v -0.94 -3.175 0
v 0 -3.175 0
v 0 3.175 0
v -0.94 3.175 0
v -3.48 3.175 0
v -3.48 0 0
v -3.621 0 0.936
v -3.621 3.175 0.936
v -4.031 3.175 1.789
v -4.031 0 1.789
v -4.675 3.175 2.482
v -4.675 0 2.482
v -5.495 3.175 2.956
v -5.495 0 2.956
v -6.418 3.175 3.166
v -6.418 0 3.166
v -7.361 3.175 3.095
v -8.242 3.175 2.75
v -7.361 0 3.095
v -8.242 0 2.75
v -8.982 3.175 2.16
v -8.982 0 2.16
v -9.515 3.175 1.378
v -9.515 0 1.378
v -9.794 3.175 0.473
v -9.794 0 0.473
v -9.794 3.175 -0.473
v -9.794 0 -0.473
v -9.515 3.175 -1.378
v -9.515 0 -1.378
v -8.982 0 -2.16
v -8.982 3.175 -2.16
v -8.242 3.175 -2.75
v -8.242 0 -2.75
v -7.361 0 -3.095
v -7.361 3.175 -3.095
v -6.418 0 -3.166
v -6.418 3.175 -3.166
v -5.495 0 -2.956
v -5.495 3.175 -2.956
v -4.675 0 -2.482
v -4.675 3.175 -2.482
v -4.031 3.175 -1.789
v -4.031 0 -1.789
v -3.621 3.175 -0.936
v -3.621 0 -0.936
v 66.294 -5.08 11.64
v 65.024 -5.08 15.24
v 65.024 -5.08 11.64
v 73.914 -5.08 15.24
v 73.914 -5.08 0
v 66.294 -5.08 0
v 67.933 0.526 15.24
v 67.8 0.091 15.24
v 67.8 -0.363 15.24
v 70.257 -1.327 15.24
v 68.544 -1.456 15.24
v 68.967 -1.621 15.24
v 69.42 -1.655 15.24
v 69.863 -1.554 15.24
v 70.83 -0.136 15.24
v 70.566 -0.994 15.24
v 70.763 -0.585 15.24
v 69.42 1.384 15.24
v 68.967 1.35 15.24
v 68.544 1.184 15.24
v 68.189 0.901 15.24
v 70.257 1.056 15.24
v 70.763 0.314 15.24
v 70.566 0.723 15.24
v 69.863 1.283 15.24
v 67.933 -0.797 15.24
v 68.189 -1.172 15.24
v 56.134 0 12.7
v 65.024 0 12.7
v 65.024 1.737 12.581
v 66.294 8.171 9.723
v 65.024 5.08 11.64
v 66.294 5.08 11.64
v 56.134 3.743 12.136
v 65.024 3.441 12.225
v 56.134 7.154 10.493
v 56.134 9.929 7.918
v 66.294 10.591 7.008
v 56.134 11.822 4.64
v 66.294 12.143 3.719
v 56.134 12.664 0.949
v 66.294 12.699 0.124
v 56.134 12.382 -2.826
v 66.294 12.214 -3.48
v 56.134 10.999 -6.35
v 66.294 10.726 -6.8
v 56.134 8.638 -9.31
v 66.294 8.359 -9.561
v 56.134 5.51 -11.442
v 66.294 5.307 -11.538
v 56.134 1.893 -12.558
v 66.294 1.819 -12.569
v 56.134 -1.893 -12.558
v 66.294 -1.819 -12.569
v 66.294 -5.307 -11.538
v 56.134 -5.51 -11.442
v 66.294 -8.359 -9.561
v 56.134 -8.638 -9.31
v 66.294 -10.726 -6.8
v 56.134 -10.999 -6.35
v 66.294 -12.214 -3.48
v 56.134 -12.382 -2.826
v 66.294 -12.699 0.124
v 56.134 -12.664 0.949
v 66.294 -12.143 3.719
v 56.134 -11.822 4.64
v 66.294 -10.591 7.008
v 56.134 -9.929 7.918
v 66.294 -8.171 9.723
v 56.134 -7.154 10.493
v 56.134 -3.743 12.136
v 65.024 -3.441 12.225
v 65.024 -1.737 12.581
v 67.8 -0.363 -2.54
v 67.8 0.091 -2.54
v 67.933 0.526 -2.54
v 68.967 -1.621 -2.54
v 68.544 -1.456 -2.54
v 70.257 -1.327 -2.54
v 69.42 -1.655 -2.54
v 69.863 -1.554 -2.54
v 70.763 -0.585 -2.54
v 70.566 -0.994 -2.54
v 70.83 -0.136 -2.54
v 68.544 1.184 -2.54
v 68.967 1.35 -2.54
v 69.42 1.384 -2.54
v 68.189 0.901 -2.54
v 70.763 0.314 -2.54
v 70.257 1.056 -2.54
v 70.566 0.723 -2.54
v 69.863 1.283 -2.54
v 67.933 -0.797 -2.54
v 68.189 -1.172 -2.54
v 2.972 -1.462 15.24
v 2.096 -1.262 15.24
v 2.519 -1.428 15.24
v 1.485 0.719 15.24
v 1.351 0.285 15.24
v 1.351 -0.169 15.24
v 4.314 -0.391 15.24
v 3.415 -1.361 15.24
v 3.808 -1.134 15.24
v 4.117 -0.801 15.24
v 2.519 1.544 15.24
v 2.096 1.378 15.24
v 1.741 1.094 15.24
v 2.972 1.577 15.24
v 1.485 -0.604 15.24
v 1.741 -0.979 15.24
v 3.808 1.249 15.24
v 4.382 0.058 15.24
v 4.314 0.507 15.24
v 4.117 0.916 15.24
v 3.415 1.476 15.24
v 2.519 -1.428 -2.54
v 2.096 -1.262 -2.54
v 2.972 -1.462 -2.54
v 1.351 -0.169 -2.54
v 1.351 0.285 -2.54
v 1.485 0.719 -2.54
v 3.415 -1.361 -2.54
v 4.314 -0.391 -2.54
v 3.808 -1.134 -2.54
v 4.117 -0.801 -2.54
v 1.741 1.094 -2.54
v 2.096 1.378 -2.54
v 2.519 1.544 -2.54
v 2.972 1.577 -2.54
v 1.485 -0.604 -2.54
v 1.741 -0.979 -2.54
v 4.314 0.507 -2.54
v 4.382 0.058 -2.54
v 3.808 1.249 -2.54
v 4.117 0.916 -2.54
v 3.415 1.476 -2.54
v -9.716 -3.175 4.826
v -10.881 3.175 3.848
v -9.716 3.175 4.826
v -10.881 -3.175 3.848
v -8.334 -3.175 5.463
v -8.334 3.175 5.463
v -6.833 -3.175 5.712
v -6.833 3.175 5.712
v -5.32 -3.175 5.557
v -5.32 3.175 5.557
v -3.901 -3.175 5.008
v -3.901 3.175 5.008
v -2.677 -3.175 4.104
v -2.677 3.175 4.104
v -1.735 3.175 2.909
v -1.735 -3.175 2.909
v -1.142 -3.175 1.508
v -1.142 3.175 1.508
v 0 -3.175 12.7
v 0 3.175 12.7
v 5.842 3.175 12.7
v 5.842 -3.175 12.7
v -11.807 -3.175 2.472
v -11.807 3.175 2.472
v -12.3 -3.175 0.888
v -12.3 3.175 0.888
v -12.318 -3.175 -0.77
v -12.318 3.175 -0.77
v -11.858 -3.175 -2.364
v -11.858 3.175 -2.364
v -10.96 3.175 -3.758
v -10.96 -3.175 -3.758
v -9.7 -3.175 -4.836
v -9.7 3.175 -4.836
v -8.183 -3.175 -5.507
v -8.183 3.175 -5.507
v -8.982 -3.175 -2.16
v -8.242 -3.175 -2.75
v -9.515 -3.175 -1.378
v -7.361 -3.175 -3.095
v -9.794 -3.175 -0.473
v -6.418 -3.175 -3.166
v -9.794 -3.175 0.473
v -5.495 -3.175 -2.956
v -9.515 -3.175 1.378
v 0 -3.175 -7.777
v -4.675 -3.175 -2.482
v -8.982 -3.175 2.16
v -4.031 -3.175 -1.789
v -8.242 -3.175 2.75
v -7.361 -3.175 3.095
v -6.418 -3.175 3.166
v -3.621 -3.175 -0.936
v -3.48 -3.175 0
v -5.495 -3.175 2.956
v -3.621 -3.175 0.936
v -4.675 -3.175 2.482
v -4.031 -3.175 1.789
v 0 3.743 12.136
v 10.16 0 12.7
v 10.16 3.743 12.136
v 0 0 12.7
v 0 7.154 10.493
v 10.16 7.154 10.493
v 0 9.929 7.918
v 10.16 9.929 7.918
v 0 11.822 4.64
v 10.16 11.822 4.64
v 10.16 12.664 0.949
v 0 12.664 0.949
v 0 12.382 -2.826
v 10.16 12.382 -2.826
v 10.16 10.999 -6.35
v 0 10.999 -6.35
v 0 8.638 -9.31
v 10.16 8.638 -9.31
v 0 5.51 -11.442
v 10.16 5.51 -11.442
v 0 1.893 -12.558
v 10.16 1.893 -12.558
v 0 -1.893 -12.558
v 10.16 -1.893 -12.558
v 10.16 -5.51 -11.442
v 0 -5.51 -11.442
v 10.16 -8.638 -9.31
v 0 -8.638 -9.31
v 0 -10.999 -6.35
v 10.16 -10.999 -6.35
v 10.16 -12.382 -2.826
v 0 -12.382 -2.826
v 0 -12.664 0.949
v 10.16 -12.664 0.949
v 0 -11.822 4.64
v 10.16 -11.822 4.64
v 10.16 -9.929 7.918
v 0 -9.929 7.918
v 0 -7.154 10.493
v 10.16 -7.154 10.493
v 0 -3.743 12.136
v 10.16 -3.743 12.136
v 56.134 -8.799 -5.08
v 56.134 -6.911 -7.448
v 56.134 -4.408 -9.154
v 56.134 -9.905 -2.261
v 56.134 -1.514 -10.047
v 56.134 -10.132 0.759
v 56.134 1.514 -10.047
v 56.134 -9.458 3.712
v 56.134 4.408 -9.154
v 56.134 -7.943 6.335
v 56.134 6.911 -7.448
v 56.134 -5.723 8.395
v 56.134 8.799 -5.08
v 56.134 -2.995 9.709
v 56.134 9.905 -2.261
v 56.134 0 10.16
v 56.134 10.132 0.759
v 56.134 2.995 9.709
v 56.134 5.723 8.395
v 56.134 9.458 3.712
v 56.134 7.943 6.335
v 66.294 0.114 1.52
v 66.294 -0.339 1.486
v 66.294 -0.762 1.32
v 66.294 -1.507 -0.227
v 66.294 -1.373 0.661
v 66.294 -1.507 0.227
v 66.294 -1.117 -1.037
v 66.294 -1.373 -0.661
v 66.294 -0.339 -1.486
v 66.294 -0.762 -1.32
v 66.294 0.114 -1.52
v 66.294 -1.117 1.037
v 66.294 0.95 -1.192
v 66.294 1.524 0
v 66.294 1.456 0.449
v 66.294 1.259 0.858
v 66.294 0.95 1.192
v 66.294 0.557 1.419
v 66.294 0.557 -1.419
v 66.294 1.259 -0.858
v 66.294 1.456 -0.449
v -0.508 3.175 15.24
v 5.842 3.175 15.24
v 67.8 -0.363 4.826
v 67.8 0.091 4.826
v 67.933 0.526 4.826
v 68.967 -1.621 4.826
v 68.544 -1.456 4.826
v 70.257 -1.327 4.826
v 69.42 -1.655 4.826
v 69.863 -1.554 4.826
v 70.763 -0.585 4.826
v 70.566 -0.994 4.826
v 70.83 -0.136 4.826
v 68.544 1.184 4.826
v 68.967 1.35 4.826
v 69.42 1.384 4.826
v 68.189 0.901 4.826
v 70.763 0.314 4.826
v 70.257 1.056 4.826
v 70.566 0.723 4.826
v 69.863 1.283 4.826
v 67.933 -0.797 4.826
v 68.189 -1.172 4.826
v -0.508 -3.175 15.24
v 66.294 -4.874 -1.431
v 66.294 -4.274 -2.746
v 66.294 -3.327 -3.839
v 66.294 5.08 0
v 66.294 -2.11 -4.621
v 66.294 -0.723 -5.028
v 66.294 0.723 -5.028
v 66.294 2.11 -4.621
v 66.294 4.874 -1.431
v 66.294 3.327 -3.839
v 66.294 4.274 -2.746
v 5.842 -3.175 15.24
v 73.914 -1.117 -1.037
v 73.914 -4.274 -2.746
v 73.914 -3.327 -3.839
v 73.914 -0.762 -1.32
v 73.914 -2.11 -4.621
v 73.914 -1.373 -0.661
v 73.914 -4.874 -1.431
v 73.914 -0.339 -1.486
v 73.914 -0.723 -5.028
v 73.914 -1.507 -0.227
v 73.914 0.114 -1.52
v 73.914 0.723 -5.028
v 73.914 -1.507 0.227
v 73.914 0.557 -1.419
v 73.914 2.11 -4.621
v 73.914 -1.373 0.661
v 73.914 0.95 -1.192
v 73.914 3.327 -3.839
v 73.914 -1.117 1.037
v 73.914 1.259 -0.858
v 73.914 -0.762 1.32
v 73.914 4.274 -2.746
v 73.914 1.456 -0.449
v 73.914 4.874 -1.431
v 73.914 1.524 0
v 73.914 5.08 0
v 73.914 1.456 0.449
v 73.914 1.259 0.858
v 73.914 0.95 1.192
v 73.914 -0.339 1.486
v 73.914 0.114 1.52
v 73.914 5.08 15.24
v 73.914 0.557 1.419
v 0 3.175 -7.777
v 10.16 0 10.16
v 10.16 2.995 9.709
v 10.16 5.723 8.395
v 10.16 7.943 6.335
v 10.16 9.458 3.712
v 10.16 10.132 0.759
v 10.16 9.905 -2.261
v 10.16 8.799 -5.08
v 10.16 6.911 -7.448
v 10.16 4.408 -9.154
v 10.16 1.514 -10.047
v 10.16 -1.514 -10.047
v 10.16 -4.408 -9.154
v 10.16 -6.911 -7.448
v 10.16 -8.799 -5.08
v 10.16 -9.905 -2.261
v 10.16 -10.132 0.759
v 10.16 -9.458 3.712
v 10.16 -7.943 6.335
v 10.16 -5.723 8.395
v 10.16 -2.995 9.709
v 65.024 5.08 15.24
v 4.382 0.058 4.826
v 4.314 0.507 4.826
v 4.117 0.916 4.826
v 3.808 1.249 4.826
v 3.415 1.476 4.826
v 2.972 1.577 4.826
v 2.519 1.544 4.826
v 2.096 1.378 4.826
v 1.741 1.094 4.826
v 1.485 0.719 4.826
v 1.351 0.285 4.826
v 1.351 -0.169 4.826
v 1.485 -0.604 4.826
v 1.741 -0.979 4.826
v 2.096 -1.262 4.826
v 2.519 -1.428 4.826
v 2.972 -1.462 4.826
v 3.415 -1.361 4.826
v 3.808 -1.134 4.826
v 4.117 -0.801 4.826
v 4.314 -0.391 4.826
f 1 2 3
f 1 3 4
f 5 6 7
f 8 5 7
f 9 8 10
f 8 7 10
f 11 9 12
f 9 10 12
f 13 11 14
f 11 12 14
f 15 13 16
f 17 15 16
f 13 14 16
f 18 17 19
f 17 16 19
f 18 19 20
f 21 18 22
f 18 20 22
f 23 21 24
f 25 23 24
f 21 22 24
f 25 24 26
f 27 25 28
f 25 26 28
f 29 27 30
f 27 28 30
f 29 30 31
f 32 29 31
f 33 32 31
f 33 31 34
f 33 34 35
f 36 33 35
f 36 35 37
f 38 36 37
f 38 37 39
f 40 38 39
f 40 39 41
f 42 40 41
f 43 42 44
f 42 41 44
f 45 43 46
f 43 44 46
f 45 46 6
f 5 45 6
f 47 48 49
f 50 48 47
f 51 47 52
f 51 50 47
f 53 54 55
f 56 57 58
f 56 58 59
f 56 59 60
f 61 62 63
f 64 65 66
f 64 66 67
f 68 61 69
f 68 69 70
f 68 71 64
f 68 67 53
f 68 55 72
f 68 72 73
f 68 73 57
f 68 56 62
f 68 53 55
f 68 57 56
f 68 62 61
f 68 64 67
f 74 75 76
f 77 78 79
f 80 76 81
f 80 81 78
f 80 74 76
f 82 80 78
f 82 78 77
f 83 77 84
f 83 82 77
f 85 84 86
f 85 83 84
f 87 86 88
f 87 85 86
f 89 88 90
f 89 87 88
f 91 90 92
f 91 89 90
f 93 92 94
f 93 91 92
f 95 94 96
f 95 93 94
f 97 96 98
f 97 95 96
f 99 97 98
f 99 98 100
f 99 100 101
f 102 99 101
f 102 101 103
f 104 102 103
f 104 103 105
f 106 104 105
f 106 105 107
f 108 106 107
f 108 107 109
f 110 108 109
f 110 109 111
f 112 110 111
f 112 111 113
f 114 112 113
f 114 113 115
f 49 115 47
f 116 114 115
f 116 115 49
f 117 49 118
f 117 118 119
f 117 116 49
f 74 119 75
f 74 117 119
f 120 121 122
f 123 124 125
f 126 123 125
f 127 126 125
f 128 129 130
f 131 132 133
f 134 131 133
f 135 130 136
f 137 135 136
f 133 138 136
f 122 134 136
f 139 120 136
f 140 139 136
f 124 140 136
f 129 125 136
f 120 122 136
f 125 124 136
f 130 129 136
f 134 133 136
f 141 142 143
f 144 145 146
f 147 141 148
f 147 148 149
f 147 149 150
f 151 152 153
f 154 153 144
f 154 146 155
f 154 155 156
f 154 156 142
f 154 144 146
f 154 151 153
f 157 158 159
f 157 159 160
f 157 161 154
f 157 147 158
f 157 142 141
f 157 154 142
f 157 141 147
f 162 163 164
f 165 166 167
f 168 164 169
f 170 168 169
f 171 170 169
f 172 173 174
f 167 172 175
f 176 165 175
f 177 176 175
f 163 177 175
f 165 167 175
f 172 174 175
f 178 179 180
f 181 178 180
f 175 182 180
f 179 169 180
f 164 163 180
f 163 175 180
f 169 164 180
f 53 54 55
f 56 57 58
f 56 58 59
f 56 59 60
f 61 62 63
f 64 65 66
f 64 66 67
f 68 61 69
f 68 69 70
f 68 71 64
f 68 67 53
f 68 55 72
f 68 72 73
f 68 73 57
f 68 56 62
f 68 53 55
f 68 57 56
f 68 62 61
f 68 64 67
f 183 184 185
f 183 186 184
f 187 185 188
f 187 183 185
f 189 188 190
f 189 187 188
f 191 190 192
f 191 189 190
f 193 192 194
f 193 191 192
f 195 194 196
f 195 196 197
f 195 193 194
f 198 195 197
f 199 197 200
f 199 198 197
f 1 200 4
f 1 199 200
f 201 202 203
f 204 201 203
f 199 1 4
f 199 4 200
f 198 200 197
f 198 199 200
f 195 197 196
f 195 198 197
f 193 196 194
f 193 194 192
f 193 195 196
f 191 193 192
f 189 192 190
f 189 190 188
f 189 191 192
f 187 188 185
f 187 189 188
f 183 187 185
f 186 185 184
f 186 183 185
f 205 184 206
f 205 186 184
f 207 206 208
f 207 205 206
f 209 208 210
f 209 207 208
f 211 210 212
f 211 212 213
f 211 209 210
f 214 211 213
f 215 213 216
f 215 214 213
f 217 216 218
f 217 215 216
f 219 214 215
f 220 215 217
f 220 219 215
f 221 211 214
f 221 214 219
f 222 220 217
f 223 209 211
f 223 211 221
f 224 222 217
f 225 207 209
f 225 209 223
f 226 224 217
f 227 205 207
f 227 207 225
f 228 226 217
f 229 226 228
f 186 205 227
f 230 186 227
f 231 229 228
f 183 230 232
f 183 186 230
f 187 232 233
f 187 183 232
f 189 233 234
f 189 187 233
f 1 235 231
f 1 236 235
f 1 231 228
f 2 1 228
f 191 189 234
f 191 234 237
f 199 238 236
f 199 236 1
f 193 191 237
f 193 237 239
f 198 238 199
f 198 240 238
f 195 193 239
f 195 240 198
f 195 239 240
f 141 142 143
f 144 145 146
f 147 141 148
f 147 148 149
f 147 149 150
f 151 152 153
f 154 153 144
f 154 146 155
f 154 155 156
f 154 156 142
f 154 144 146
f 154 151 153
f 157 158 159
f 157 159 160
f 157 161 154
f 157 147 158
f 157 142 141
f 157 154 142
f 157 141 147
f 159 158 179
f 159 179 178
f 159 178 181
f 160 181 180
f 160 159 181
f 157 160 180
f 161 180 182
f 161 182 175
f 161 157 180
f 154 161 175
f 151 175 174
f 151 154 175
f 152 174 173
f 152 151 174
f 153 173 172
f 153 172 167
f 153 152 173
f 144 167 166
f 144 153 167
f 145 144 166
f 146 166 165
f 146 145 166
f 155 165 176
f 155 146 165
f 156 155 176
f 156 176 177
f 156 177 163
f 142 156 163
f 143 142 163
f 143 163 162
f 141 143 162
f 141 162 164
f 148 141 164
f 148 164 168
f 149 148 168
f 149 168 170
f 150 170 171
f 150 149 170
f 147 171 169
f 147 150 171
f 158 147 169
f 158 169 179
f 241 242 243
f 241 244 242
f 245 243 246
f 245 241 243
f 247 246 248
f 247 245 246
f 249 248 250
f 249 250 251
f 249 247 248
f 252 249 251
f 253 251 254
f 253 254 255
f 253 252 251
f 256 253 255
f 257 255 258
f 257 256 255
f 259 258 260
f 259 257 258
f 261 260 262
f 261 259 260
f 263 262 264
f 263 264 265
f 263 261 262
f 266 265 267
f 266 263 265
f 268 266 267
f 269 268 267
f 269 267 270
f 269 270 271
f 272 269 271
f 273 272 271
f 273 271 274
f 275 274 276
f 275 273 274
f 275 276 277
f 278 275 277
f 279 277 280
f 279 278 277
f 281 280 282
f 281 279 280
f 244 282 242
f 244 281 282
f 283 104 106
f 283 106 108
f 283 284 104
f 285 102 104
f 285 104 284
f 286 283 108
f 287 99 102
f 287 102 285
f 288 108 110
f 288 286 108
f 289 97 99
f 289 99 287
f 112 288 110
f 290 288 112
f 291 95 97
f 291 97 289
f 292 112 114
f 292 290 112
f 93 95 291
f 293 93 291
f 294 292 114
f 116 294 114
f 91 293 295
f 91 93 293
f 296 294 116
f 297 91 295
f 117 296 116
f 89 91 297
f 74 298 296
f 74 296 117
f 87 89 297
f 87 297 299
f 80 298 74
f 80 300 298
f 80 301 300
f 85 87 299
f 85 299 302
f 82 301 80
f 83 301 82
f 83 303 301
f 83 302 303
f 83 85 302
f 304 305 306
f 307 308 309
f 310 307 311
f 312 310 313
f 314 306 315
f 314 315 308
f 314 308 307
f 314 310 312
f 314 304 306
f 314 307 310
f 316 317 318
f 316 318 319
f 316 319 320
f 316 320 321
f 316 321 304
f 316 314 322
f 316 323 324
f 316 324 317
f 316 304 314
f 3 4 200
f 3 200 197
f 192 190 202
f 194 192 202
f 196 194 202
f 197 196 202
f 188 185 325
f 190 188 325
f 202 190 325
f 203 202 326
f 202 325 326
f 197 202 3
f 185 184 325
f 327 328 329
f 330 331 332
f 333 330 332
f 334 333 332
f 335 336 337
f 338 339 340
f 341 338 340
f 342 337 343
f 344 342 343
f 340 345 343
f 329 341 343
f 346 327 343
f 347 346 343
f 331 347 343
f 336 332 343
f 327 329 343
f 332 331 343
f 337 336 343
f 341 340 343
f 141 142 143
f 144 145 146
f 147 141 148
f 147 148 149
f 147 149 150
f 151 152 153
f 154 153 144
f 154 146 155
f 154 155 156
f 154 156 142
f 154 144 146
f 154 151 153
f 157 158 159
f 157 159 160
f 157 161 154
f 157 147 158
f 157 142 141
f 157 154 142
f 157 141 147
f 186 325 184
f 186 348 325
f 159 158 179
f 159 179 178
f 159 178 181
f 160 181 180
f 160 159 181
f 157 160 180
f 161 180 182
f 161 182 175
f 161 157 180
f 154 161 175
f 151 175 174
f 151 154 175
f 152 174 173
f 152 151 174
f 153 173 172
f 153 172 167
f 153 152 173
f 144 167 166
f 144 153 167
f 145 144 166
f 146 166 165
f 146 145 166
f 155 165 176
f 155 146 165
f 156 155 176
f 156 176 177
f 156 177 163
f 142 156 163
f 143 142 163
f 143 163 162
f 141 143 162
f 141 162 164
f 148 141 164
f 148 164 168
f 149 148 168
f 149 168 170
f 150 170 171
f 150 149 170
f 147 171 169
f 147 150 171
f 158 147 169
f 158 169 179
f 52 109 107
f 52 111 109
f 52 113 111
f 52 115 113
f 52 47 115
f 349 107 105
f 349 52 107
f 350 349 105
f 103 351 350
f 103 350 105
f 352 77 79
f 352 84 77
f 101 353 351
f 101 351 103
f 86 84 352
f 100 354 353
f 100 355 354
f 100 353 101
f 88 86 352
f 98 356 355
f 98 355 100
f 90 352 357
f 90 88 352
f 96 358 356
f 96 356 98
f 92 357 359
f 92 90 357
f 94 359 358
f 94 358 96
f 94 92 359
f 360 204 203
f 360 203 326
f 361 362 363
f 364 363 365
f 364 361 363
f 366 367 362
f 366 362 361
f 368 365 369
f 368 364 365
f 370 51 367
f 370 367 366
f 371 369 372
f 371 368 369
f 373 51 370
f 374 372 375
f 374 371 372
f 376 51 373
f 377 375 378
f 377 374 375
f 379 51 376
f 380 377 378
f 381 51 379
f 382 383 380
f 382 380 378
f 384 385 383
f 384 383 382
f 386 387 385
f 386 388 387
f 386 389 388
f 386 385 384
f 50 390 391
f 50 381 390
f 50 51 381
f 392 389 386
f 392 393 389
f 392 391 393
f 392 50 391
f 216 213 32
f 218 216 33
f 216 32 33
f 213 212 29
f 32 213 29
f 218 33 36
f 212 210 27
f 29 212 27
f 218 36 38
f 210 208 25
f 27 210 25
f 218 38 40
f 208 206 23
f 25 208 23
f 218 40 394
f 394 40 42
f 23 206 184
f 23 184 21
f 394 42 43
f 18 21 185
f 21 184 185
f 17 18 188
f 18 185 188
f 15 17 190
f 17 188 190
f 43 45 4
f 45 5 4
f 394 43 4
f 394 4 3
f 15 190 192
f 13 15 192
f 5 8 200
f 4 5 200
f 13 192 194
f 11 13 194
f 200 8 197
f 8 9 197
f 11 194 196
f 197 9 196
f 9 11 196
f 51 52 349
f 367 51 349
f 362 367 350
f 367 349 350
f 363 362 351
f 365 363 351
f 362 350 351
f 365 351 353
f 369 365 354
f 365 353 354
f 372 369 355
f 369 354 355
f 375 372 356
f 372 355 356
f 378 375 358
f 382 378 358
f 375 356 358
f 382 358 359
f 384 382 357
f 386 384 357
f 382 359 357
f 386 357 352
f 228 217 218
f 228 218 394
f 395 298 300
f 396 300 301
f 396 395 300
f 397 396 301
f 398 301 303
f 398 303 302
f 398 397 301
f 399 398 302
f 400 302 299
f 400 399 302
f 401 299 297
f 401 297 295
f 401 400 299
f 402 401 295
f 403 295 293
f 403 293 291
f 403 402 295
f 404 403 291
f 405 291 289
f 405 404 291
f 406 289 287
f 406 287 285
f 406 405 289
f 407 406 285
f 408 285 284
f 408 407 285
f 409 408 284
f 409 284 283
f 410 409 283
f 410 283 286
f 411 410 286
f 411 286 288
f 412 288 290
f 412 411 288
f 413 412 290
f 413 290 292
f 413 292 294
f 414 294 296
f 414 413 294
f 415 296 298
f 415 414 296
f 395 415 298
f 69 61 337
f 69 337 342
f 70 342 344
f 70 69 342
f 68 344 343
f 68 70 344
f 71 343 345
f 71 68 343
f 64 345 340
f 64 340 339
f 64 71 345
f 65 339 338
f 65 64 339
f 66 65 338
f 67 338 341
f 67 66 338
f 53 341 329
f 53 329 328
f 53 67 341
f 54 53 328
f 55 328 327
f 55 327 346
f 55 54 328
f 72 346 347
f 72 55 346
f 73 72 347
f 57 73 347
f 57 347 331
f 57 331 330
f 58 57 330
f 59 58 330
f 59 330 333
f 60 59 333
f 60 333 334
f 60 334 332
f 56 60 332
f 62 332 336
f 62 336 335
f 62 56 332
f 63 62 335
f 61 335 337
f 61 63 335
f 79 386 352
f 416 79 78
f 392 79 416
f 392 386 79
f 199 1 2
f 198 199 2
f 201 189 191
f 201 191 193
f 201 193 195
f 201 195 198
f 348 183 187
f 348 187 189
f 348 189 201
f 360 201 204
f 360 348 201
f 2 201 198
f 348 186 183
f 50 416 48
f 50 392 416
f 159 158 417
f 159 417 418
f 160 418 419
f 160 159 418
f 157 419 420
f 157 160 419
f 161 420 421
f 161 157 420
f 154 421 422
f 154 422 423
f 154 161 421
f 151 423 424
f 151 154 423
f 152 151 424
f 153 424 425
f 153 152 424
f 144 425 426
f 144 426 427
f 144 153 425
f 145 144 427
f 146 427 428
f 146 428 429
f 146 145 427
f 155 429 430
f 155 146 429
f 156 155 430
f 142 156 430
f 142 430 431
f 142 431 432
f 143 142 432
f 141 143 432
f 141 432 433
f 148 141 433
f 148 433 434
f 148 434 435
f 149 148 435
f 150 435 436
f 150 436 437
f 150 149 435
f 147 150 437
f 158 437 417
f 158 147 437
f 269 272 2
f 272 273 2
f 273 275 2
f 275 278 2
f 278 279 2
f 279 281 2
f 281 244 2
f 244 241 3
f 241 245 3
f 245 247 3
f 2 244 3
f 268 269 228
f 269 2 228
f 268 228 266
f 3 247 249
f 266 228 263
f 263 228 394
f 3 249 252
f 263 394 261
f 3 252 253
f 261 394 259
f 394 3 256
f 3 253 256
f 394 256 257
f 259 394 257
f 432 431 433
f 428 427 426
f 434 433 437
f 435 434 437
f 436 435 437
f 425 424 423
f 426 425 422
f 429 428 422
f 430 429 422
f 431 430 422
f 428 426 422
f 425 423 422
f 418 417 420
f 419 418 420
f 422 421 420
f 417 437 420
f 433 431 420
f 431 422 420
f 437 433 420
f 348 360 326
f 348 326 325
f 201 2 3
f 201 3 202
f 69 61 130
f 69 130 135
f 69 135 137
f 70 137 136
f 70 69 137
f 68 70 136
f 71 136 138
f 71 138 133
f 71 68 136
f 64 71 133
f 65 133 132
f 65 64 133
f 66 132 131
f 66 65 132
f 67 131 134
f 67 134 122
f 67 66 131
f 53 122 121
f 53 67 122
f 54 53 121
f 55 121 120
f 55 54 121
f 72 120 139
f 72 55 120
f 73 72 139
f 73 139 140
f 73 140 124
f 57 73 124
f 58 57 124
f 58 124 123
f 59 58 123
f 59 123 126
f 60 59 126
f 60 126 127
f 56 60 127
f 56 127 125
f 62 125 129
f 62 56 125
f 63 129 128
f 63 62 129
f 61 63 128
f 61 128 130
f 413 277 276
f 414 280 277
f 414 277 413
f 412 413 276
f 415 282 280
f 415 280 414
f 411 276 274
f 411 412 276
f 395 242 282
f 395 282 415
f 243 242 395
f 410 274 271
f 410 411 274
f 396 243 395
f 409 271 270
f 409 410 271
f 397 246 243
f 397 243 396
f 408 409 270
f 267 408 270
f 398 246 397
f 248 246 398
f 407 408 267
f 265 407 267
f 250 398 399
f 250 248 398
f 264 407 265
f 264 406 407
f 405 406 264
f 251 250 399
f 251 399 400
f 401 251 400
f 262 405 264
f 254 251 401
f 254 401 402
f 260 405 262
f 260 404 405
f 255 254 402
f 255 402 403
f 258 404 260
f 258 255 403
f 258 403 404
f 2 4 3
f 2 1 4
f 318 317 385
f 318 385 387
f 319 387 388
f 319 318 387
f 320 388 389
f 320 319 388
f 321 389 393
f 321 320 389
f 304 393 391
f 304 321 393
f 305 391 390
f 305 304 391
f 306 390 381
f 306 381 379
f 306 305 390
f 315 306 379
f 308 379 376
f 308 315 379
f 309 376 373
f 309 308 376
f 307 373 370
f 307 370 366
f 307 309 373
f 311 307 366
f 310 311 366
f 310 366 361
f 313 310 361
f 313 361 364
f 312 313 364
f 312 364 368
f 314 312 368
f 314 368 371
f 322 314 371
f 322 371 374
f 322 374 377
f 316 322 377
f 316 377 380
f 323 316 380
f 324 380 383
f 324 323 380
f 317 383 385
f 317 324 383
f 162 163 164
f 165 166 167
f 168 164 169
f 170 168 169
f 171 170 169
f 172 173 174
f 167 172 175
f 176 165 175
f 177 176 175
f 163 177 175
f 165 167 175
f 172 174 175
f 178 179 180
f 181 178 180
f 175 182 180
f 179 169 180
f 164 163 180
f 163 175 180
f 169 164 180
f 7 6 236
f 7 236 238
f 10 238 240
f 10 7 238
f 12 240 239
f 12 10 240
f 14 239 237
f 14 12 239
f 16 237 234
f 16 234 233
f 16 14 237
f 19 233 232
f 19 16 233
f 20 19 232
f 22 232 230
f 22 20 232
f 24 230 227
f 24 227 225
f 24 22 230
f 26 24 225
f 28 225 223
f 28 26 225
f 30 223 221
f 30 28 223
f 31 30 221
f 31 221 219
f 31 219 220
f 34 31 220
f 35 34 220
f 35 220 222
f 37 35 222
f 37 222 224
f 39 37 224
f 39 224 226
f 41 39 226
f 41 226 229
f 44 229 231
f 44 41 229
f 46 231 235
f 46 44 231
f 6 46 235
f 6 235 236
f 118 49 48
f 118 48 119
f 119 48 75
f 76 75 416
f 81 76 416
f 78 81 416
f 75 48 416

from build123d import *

# Parameters (mm, degrees)
F0_W          = 5.842
F0_H          = 12.7
F0_R          = 3.175
F2_DEPTH      = 3.175
F3_DEPTH      = 3.175
F4_R          = 1.524
F5_DEPTH      = 7.62
F5_DEPTH_BACK = 1.27
F7_R          = 1.524
F8_DEPTH      = 17.78
F9_DEPTH      = 17.78
F10_DEPTH     = 10.414


with BuildPart() as f1:
    # F0 (on Front) → F1 (revolve)
    with BuildSketch(Plane.XZ):
        Polygon((5.842, 12.7), (5.842, 0), (66.294, 0), (66.294, 12.7), (56.134, 12.7), (56.134, 10.16), (10.16, 10.16), (10.16, 12.7), align=None)
        with Locations((2.921, 6.35)):
            Rectangle(F0_W, F0_H)
    revolve(axis=Axis((33.147, 0, 0), (-1, 0, 0)))

    # F0 (on Front) → F2 (join, symmetric)
    with BuildSketch(Plane.XZ):
        with BuildLine():
            ThreePointArc((-8.1826630726, -5.5069827884), (-3.1957909266, -4.5493385486), (-0.9398, 0))
            ThreePointArc((-0.9398, 0), (-4.5919612295, 5.3297205562), (-10.8806298187, 3.8475430269))
            ThreePointArc((-10.8806298187, 3.8475430269), (-12.1459778134, -1.5837270034), (-8.1826630726, -5.5069827884))
        make_face()
        with Locations((-6.6548, 0)):
            Circle(F0_R, mode=Mode.SUBTRACT)
        with BuildLine():
            Line((5.842, 0), (0, 0))
            Line((0, 0), (-0.9398, 0))
            ThreePointArc((-0.9398, 0), (-3.1957909266, -4.5493385486), (-8.1826630726, -5.5069827884))
            Line((-8.1826630726, -5.5069827884), (5.842, -9.398))
            Line((5.842, -9.398), (5.842, 0))
        make_face()
    extrude(amount=F2_DEPTH, both=True)

    # F4 (on face) → F5 (join, two sides)
    with BuildSketch(Plane.YZ.offset(66.294)) as f5_sk:
        with BuildLine():
            ThreePointArc((-5.08, 0), (0, -5.08), (5.08, 0))
            ThreePointArc((5.08, 0), (0, 5.08), (-5.08, 0))
        make_face()
        Circle(F4_R, mode=Mode.SUBTRACT)
        with BuildLine():
            ThreePointArc((-5.08, 0), (0, 5.08), (5.08, 0))
            Line((5.08, 0), (5.08, 15.24))
            Line((5.08, 15.24), (-5.08, 15.24))
            Line((-5.08, 15.24), (-5.08, 0))
        make_face()
    extrude(amount=F5_DEPTH)
    extrude(f5_sk.sketch, amount=-F5_DEPTH_BACK)


with BuildPart() as f3:
    # F0 (on Front) → F3 (new body, symmetric)
    with BuildSketch(Plane.XZ):
        with BuildLine():
            Line((-0.9398, 0), (0, 0))
            Line((0, 0), (0, 12.7))
            Line((0, 12.7), (5.842, 12.7))
            Line((5.842, 12.7), (5.842, 15.24))
            Line((5.842, 15.24), (-0.508, 15.24))
            Line((-0.508, 15.24), (-10.8806298187, 3.8475430269))
            ThreePointArc((-10.8806298187, 3.8475430269), (-4.5919612295, 5.3297205562), (-0.9398, 0))
        make_face()
    extrude(amount=F3_DEPTH, both=True)


with BuildPart() as f8:
    # F7 (on face) → F8 (new body)
    with BuildSketch(Plane.XY.offset(15.24)):
        with Locations((69.3064853549, -0.1356968132)):
            Circle(F7_R)
    extrude(amount=-F8_DEPTH)


with BuildPart() as f8b:
    # F7 (on face) → F8, piece 2 (new body)
    with BuildSketch(Plane.XY.offset(15.24)):
        with Locations((2.8581172228, 0.0577344617)):
            Circle(F7_R)
    extrude(amount=-F8_DEPTH)


with BuildPart() as f9:
    # F9 (new): a face of the model
    f9_faces = [f8b.part.faces().sort_by_distance(p)[0] for p in [
        (2.8581172228, 0.0577344617, 15.24),
    ]]
    extrude(f9_faces, amount=-F9_DEPTH)


with BuildPart() as f10:
    # F7 (on face) → F10 (new body)
    with BuildSketch(Plane.XY.offset(15.24)):
        with Locations((69.3064853549, -0.1356968132)):
            Circle(F7_R)
    extrude(amount=-F10_DEPTH)


with BuildPart() as f10b:
    # F7 (on face) → F10, piece 2 (new body)
    with BuildSketch(Plane.XY.offset(15.24)):
        with Locations((2.8581172228, 0.0577344617)):
            Circle(F7_R)
    extrude(amount=-F10_DEPTH)


solid = Compound([f1.part, f3.part, f8.part, f8b.part, f9.part, f10.part, f10b.part])
